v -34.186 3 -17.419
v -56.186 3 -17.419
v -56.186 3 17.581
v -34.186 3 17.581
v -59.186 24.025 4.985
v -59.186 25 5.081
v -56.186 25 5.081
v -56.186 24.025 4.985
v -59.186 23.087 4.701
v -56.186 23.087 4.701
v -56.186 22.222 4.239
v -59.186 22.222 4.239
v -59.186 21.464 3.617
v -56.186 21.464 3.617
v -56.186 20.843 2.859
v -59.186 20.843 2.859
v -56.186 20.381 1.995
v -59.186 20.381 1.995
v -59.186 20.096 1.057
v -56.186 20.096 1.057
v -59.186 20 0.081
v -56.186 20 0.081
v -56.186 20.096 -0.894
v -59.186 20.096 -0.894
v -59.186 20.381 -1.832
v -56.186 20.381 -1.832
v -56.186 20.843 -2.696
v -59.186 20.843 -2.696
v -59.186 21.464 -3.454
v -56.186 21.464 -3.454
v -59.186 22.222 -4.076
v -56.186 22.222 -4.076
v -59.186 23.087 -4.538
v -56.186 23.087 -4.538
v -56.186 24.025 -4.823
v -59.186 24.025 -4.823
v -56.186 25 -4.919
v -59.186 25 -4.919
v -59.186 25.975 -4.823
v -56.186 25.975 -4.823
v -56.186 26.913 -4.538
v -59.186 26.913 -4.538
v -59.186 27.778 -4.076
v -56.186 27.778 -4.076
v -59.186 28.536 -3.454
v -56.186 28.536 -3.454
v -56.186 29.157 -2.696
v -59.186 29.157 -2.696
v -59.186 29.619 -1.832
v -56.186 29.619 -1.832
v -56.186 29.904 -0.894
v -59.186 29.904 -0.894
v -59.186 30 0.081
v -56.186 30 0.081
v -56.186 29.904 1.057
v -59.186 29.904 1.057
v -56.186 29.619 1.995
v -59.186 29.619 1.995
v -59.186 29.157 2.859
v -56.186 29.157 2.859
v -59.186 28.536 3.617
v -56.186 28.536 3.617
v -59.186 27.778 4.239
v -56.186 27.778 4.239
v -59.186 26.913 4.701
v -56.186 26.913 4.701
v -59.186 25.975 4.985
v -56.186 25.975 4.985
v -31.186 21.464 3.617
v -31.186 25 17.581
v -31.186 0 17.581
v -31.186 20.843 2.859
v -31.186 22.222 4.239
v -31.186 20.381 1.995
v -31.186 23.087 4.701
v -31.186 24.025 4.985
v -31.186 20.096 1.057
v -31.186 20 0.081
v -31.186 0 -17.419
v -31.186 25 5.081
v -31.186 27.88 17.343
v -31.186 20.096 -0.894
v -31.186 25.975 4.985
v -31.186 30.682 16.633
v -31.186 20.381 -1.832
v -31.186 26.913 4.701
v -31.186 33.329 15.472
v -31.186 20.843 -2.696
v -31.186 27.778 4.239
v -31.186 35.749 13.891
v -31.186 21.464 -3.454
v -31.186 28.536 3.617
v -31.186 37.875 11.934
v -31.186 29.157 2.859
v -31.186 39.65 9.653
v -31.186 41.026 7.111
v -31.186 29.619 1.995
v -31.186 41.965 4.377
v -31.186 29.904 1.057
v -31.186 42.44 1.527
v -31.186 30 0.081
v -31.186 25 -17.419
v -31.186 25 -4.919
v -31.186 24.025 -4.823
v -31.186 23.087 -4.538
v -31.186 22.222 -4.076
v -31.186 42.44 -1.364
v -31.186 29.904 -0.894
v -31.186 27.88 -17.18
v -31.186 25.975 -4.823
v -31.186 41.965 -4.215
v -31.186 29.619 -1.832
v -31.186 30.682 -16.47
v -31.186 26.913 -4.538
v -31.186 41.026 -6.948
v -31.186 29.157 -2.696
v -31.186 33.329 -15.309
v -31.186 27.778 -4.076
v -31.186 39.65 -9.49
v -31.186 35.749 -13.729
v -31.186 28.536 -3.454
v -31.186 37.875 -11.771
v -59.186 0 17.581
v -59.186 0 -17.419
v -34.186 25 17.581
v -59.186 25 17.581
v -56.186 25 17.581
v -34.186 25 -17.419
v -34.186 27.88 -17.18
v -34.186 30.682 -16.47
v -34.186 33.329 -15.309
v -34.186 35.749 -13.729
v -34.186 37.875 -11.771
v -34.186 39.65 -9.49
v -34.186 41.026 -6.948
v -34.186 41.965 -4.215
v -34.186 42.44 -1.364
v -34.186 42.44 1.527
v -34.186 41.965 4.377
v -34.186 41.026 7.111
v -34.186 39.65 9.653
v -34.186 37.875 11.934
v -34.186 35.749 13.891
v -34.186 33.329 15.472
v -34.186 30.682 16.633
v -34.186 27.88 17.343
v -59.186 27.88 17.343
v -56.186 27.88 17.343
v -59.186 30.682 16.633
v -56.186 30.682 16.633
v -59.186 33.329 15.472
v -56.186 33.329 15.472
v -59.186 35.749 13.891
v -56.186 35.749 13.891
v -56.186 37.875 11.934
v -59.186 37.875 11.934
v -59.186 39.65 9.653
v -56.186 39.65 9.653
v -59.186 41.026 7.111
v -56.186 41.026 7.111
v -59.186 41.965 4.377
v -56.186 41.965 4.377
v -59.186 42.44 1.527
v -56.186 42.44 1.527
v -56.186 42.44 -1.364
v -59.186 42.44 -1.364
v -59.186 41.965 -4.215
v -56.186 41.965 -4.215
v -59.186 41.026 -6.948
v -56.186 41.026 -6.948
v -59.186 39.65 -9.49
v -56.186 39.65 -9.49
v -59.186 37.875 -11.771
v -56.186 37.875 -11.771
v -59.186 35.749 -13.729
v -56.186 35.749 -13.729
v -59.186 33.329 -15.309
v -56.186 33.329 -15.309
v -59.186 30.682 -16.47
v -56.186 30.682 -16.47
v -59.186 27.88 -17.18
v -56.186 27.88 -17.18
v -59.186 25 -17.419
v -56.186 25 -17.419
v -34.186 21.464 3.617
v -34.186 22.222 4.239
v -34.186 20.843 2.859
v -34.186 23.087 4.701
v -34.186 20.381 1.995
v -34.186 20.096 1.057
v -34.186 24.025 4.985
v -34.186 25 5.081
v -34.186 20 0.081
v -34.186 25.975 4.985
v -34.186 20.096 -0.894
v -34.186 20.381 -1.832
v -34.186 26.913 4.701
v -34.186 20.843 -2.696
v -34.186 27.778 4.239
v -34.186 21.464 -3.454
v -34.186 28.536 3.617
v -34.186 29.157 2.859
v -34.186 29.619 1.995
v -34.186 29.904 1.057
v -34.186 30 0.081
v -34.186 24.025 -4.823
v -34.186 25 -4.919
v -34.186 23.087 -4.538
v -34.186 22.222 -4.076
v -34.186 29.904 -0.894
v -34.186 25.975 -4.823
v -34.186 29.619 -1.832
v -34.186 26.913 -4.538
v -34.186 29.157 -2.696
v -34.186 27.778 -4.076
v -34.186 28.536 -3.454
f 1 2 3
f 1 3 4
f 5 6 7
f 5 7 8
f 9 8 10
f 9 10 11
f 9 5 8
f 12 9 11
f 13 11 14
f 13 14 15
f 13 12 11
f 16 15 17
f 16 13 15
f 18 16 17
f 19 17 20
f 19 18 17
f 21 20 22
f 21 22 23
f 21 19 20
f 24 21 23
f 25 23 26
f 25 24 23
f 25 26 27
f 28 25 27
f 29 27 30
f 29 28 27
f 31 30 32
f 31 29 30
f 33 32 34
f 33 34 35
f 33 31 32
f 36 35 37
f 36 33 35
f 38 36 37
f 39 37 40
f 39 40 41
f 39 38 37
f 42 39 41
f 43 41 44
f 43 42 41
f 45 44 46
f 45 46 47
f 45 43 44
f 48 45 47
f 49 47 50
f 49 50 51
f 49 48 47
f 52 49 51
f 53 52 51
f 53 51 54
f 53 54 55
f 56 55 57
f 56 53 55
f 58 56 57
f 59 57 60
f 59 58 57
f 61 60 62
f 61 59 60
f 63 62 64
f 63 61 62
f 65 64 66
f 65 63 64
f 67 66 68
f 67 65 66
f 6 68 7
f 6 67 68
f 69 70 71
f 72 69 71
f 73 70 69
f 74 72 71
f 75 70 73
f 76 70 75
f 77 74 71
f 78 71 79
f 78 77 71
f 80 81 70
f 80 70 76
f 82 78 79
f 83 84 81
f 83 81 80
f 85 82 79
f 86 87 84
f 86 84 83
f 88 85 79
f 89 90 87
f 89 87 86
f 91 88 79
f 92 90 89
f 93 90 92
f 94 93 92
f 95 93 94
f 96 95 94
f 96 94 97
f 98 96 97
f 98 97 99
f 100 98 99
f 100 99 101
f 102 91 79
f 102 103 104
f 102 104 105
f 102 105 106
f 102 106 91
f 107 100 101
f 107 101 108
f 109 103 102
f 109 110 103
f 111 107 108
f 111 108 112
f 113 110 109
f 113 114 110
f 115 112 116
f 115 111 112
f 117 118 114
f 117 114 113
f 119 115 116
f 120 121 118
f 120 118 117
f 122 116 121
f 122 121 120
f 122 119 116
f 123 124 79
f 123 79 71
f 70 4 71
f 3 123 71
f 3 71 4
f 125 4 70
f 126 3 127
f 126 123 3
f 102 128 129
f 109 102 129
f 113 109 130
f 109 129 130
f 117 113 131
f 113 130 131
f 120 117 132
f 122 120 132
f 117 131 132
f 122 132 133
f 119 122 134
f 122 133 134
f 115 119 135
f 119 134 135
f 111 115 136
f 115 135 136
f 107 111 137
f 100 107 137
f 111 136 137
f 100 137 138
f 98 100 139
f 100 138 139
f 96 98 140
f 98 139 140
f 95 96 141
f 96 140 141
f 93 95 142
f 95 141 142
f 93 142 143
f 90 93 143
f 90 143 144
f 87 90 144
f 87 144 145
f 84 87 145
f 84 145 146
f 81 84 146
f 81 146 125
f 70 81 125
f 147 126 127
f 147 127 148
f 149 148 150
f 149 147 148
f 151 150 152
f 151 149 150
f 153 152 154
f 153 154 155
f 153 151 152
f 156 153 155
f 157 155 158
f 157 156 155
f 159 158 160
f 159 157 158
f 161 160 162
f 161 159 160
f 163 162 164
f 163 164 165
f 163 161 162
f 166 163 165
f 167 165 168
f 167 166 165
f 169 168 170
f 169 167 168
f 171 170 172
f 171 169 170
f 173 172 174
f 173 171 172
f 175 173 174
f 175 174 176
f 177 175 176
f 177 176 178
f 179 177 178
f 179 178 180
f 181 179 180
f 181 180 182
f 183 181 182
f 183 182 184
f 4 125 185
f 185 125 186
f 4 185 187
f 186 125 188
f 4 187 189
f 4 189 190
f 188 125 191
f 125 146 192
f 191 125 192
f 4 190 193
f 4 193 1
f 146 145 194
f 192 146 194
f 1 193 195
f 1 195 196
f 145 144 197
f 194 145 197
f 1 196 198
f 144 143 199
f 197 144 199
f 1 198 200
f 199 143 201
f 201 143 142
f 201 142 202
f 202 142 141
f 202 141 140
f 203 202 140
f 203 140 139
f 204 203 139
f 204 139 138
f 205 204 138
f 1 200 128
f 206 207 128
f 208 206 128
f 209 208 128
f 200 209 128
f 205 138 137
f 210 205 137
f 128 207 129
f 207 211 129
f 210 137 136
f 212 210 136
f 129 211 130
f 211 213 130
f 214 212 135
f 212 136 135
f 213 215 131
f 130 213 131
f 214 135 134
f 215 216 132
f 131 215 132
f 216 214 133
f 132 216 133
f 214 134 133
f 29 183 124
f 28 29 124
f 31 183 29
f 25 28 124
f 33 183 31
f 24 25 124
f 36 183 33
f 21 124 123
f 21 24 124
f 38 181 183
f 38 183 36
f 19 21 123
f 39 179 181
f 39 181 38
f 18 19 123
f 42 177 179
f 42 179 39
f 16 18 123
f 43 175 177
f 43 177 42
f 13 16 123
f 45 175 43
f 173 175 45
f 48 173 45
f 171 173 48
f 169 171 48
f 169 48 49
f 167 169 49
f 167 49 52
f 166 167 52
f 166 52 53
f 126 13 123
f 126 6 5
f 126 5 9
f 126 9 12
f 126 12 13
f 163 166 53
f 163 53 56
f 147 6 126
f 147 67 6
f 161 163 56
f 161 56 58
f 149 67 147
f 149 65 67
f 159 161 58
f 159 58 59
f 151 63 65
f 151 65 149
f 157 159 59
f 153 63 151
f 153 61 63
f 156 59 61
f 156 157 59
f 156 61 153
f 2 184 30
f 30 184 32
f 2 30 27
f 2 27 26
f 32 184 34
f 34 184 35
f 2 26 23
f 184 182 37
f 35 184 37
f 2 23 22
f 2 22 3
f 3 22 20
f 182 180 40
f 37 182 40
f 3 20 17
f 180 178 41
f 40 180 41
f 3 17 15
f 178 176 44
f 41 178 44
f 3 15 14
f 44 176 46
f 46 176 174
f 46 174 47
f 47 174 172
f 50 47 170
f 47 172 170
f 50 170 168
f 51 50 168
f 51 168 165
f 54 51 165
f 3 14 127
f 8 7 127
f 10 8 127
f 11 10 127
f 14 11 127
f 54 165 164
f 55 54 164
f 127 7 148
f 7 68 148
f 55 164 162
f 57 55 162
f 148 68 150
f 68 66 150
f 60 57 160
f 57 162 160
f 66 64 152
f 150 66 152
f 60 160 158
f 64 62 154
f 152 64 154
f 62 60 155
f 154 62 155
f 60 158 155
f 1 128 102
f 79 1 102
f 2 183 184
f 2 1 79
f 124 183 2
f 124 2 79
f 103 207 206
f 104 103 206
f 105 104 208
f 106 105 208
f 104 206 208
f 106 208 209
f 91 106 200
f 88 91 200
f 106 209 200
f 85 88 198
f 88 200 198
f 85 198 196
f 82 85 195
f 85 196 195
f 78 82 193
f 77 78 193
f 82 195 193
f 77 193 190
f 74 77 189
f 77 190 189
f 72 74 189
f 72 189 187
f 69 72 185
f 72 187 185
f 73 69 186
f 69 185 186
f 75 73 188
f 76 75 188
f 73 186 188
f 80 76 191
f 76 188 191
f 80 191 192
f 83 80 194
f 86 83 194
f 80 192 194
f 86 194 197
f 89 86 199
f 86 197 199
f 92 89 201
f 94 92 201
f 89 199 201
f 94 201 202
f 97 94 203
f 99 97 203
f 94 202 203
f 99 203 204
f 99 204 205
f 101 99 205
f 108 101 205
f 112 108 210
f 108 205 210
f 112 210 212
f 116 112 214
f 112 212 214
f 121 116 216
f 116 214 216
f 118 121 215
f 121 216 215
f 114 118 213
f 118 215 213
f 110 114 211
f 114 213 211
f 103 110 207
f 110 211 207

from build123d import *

# Parameters (mm, degrees)
SKETCH1_W           = 22
SKETCH1_H           = 35
BOSS_EXTRUDE1_DEPTH = 3
SKETCH2_W           = 35
SKETCH2_H           = 3
BOSS_EXTRUDE6_DEPTH = 3
BOSS_EXTRUDE7_START = 3
SKETCH4_W           = 35
SKETCH4_H           = 3
BOSS_EXTRUDE7_DEPTH = 3


with BuildPart() as part:
    # Sketch1 → Boss-Extrude1 (new body)
    with BuildSketch(Plane(origin=(0, 0, 0), x_dir=(1, 0, 0), z_dir=(0, 1, 0))):
        with Locations((-45.186046512, -0.081395349)):
            Rectangle(SKETCH1_W, SKETCH1_H)
    extrude(amount=BOSS_EXTRUDE1_DEPTH)

    # Sketch2 → Boss-Extrude6 (add)
    with BuildSketch(Plane(origin=(-34.186046512, 0, 0), x_dir=(0, 0, -1), z_dir=(1, 0, 0))):
        with BuildLine():
            ThreePointArc((17.418604651, 25), (-0.081395349, 42.5), (-17.581395349, 25))
            Line((-17.581395349, 25), (-5.081395349, 25))
            ThreePointArc((-5.081395349, 25), (-0.081395349, 30), (4.918604651, 25))
            Line((4.918604651, 25), (17.418604651, 25))
        make_face()
        with BuildLine():
            Line((-5.081395349, 25), (-17.581395349, 25))
            ThreePointArc((-17.581395349, 25), (-0.081395349, 7.5), (17.418604651, 25))
            Line((17.418604651, 25), (4.918604651, 25))
            ThreePointArc((4.918604651, 25), (-0.081395349, 20), (-5.081395349, 25))
        make_face()
        with BuildLine():
            Line((-17.581395349, 25), (-17.581395349, 3))
            Line((-17.581395349, 3), (17.418604651, 3))
            Line((17.418604651, 3), (17.418604651, 25))
            ThreePointArc((17.418604651, 25), (-0.081395349, 7.5), (-17.581395349, 25))
        make_face()
        with Locations((-0.081395349, 1.5)):
            Rectangle(SKETCH2_W, SKETCH2_H)
    extrude(amount=BOSS_EXTRUDE6_DEPTH)

    # Sketch4 → Boss-Extrude7 (add)
    with BuildSketch(Plane.ZY.offset(56.186046512).offset(BOSS_EXTRUDE7_START)):
        with BuildLine():
            ThreePointArc((17.581395349, 25), (0.081395349, 42.5), (-17.418604651, 25))
            Line((-17.418604651, 25), (-4.918604651, 25))
            ThreePointArc((-4.918604651, 25), (0.081395349, 30), (5.081395349, 25))
            Line((5.081395349, 25), (17.581395349, 25))
        make_face()
        with BuildLine():
            Line((-4.918604651, 25), (-17.418604651, 25))
            ThreePointArc((-17.418604651, 25), (0.081395349, 7.5), (17.581395349, 25))
            Line((17.581395349, 25), (5.081395349, 25))
            ThreePointArc((5.081395349, 25), (0.081395349, 20), (-4.918604651, 25))
        make_face()
        with BuildLine():
            Line((-17.418604651, 25), (-17.418604651, 3))
            Line((-17.418604651, 3), (17.581395349, 3))
            Line((17.581395349, 3), (17.581395349, 25))
            ThreePointArc((17.581395349, 25), (0.081395349, 7.5), (-17.418604651, 25))
        make_face()
        with Locations((0.081395349, 1.5)):
            Rectangle(SKETCH4_W, SKETCH4_H)
    extrude(amount=-BOSS_EXTRUDE7_DEPTH)


solid = part.part
